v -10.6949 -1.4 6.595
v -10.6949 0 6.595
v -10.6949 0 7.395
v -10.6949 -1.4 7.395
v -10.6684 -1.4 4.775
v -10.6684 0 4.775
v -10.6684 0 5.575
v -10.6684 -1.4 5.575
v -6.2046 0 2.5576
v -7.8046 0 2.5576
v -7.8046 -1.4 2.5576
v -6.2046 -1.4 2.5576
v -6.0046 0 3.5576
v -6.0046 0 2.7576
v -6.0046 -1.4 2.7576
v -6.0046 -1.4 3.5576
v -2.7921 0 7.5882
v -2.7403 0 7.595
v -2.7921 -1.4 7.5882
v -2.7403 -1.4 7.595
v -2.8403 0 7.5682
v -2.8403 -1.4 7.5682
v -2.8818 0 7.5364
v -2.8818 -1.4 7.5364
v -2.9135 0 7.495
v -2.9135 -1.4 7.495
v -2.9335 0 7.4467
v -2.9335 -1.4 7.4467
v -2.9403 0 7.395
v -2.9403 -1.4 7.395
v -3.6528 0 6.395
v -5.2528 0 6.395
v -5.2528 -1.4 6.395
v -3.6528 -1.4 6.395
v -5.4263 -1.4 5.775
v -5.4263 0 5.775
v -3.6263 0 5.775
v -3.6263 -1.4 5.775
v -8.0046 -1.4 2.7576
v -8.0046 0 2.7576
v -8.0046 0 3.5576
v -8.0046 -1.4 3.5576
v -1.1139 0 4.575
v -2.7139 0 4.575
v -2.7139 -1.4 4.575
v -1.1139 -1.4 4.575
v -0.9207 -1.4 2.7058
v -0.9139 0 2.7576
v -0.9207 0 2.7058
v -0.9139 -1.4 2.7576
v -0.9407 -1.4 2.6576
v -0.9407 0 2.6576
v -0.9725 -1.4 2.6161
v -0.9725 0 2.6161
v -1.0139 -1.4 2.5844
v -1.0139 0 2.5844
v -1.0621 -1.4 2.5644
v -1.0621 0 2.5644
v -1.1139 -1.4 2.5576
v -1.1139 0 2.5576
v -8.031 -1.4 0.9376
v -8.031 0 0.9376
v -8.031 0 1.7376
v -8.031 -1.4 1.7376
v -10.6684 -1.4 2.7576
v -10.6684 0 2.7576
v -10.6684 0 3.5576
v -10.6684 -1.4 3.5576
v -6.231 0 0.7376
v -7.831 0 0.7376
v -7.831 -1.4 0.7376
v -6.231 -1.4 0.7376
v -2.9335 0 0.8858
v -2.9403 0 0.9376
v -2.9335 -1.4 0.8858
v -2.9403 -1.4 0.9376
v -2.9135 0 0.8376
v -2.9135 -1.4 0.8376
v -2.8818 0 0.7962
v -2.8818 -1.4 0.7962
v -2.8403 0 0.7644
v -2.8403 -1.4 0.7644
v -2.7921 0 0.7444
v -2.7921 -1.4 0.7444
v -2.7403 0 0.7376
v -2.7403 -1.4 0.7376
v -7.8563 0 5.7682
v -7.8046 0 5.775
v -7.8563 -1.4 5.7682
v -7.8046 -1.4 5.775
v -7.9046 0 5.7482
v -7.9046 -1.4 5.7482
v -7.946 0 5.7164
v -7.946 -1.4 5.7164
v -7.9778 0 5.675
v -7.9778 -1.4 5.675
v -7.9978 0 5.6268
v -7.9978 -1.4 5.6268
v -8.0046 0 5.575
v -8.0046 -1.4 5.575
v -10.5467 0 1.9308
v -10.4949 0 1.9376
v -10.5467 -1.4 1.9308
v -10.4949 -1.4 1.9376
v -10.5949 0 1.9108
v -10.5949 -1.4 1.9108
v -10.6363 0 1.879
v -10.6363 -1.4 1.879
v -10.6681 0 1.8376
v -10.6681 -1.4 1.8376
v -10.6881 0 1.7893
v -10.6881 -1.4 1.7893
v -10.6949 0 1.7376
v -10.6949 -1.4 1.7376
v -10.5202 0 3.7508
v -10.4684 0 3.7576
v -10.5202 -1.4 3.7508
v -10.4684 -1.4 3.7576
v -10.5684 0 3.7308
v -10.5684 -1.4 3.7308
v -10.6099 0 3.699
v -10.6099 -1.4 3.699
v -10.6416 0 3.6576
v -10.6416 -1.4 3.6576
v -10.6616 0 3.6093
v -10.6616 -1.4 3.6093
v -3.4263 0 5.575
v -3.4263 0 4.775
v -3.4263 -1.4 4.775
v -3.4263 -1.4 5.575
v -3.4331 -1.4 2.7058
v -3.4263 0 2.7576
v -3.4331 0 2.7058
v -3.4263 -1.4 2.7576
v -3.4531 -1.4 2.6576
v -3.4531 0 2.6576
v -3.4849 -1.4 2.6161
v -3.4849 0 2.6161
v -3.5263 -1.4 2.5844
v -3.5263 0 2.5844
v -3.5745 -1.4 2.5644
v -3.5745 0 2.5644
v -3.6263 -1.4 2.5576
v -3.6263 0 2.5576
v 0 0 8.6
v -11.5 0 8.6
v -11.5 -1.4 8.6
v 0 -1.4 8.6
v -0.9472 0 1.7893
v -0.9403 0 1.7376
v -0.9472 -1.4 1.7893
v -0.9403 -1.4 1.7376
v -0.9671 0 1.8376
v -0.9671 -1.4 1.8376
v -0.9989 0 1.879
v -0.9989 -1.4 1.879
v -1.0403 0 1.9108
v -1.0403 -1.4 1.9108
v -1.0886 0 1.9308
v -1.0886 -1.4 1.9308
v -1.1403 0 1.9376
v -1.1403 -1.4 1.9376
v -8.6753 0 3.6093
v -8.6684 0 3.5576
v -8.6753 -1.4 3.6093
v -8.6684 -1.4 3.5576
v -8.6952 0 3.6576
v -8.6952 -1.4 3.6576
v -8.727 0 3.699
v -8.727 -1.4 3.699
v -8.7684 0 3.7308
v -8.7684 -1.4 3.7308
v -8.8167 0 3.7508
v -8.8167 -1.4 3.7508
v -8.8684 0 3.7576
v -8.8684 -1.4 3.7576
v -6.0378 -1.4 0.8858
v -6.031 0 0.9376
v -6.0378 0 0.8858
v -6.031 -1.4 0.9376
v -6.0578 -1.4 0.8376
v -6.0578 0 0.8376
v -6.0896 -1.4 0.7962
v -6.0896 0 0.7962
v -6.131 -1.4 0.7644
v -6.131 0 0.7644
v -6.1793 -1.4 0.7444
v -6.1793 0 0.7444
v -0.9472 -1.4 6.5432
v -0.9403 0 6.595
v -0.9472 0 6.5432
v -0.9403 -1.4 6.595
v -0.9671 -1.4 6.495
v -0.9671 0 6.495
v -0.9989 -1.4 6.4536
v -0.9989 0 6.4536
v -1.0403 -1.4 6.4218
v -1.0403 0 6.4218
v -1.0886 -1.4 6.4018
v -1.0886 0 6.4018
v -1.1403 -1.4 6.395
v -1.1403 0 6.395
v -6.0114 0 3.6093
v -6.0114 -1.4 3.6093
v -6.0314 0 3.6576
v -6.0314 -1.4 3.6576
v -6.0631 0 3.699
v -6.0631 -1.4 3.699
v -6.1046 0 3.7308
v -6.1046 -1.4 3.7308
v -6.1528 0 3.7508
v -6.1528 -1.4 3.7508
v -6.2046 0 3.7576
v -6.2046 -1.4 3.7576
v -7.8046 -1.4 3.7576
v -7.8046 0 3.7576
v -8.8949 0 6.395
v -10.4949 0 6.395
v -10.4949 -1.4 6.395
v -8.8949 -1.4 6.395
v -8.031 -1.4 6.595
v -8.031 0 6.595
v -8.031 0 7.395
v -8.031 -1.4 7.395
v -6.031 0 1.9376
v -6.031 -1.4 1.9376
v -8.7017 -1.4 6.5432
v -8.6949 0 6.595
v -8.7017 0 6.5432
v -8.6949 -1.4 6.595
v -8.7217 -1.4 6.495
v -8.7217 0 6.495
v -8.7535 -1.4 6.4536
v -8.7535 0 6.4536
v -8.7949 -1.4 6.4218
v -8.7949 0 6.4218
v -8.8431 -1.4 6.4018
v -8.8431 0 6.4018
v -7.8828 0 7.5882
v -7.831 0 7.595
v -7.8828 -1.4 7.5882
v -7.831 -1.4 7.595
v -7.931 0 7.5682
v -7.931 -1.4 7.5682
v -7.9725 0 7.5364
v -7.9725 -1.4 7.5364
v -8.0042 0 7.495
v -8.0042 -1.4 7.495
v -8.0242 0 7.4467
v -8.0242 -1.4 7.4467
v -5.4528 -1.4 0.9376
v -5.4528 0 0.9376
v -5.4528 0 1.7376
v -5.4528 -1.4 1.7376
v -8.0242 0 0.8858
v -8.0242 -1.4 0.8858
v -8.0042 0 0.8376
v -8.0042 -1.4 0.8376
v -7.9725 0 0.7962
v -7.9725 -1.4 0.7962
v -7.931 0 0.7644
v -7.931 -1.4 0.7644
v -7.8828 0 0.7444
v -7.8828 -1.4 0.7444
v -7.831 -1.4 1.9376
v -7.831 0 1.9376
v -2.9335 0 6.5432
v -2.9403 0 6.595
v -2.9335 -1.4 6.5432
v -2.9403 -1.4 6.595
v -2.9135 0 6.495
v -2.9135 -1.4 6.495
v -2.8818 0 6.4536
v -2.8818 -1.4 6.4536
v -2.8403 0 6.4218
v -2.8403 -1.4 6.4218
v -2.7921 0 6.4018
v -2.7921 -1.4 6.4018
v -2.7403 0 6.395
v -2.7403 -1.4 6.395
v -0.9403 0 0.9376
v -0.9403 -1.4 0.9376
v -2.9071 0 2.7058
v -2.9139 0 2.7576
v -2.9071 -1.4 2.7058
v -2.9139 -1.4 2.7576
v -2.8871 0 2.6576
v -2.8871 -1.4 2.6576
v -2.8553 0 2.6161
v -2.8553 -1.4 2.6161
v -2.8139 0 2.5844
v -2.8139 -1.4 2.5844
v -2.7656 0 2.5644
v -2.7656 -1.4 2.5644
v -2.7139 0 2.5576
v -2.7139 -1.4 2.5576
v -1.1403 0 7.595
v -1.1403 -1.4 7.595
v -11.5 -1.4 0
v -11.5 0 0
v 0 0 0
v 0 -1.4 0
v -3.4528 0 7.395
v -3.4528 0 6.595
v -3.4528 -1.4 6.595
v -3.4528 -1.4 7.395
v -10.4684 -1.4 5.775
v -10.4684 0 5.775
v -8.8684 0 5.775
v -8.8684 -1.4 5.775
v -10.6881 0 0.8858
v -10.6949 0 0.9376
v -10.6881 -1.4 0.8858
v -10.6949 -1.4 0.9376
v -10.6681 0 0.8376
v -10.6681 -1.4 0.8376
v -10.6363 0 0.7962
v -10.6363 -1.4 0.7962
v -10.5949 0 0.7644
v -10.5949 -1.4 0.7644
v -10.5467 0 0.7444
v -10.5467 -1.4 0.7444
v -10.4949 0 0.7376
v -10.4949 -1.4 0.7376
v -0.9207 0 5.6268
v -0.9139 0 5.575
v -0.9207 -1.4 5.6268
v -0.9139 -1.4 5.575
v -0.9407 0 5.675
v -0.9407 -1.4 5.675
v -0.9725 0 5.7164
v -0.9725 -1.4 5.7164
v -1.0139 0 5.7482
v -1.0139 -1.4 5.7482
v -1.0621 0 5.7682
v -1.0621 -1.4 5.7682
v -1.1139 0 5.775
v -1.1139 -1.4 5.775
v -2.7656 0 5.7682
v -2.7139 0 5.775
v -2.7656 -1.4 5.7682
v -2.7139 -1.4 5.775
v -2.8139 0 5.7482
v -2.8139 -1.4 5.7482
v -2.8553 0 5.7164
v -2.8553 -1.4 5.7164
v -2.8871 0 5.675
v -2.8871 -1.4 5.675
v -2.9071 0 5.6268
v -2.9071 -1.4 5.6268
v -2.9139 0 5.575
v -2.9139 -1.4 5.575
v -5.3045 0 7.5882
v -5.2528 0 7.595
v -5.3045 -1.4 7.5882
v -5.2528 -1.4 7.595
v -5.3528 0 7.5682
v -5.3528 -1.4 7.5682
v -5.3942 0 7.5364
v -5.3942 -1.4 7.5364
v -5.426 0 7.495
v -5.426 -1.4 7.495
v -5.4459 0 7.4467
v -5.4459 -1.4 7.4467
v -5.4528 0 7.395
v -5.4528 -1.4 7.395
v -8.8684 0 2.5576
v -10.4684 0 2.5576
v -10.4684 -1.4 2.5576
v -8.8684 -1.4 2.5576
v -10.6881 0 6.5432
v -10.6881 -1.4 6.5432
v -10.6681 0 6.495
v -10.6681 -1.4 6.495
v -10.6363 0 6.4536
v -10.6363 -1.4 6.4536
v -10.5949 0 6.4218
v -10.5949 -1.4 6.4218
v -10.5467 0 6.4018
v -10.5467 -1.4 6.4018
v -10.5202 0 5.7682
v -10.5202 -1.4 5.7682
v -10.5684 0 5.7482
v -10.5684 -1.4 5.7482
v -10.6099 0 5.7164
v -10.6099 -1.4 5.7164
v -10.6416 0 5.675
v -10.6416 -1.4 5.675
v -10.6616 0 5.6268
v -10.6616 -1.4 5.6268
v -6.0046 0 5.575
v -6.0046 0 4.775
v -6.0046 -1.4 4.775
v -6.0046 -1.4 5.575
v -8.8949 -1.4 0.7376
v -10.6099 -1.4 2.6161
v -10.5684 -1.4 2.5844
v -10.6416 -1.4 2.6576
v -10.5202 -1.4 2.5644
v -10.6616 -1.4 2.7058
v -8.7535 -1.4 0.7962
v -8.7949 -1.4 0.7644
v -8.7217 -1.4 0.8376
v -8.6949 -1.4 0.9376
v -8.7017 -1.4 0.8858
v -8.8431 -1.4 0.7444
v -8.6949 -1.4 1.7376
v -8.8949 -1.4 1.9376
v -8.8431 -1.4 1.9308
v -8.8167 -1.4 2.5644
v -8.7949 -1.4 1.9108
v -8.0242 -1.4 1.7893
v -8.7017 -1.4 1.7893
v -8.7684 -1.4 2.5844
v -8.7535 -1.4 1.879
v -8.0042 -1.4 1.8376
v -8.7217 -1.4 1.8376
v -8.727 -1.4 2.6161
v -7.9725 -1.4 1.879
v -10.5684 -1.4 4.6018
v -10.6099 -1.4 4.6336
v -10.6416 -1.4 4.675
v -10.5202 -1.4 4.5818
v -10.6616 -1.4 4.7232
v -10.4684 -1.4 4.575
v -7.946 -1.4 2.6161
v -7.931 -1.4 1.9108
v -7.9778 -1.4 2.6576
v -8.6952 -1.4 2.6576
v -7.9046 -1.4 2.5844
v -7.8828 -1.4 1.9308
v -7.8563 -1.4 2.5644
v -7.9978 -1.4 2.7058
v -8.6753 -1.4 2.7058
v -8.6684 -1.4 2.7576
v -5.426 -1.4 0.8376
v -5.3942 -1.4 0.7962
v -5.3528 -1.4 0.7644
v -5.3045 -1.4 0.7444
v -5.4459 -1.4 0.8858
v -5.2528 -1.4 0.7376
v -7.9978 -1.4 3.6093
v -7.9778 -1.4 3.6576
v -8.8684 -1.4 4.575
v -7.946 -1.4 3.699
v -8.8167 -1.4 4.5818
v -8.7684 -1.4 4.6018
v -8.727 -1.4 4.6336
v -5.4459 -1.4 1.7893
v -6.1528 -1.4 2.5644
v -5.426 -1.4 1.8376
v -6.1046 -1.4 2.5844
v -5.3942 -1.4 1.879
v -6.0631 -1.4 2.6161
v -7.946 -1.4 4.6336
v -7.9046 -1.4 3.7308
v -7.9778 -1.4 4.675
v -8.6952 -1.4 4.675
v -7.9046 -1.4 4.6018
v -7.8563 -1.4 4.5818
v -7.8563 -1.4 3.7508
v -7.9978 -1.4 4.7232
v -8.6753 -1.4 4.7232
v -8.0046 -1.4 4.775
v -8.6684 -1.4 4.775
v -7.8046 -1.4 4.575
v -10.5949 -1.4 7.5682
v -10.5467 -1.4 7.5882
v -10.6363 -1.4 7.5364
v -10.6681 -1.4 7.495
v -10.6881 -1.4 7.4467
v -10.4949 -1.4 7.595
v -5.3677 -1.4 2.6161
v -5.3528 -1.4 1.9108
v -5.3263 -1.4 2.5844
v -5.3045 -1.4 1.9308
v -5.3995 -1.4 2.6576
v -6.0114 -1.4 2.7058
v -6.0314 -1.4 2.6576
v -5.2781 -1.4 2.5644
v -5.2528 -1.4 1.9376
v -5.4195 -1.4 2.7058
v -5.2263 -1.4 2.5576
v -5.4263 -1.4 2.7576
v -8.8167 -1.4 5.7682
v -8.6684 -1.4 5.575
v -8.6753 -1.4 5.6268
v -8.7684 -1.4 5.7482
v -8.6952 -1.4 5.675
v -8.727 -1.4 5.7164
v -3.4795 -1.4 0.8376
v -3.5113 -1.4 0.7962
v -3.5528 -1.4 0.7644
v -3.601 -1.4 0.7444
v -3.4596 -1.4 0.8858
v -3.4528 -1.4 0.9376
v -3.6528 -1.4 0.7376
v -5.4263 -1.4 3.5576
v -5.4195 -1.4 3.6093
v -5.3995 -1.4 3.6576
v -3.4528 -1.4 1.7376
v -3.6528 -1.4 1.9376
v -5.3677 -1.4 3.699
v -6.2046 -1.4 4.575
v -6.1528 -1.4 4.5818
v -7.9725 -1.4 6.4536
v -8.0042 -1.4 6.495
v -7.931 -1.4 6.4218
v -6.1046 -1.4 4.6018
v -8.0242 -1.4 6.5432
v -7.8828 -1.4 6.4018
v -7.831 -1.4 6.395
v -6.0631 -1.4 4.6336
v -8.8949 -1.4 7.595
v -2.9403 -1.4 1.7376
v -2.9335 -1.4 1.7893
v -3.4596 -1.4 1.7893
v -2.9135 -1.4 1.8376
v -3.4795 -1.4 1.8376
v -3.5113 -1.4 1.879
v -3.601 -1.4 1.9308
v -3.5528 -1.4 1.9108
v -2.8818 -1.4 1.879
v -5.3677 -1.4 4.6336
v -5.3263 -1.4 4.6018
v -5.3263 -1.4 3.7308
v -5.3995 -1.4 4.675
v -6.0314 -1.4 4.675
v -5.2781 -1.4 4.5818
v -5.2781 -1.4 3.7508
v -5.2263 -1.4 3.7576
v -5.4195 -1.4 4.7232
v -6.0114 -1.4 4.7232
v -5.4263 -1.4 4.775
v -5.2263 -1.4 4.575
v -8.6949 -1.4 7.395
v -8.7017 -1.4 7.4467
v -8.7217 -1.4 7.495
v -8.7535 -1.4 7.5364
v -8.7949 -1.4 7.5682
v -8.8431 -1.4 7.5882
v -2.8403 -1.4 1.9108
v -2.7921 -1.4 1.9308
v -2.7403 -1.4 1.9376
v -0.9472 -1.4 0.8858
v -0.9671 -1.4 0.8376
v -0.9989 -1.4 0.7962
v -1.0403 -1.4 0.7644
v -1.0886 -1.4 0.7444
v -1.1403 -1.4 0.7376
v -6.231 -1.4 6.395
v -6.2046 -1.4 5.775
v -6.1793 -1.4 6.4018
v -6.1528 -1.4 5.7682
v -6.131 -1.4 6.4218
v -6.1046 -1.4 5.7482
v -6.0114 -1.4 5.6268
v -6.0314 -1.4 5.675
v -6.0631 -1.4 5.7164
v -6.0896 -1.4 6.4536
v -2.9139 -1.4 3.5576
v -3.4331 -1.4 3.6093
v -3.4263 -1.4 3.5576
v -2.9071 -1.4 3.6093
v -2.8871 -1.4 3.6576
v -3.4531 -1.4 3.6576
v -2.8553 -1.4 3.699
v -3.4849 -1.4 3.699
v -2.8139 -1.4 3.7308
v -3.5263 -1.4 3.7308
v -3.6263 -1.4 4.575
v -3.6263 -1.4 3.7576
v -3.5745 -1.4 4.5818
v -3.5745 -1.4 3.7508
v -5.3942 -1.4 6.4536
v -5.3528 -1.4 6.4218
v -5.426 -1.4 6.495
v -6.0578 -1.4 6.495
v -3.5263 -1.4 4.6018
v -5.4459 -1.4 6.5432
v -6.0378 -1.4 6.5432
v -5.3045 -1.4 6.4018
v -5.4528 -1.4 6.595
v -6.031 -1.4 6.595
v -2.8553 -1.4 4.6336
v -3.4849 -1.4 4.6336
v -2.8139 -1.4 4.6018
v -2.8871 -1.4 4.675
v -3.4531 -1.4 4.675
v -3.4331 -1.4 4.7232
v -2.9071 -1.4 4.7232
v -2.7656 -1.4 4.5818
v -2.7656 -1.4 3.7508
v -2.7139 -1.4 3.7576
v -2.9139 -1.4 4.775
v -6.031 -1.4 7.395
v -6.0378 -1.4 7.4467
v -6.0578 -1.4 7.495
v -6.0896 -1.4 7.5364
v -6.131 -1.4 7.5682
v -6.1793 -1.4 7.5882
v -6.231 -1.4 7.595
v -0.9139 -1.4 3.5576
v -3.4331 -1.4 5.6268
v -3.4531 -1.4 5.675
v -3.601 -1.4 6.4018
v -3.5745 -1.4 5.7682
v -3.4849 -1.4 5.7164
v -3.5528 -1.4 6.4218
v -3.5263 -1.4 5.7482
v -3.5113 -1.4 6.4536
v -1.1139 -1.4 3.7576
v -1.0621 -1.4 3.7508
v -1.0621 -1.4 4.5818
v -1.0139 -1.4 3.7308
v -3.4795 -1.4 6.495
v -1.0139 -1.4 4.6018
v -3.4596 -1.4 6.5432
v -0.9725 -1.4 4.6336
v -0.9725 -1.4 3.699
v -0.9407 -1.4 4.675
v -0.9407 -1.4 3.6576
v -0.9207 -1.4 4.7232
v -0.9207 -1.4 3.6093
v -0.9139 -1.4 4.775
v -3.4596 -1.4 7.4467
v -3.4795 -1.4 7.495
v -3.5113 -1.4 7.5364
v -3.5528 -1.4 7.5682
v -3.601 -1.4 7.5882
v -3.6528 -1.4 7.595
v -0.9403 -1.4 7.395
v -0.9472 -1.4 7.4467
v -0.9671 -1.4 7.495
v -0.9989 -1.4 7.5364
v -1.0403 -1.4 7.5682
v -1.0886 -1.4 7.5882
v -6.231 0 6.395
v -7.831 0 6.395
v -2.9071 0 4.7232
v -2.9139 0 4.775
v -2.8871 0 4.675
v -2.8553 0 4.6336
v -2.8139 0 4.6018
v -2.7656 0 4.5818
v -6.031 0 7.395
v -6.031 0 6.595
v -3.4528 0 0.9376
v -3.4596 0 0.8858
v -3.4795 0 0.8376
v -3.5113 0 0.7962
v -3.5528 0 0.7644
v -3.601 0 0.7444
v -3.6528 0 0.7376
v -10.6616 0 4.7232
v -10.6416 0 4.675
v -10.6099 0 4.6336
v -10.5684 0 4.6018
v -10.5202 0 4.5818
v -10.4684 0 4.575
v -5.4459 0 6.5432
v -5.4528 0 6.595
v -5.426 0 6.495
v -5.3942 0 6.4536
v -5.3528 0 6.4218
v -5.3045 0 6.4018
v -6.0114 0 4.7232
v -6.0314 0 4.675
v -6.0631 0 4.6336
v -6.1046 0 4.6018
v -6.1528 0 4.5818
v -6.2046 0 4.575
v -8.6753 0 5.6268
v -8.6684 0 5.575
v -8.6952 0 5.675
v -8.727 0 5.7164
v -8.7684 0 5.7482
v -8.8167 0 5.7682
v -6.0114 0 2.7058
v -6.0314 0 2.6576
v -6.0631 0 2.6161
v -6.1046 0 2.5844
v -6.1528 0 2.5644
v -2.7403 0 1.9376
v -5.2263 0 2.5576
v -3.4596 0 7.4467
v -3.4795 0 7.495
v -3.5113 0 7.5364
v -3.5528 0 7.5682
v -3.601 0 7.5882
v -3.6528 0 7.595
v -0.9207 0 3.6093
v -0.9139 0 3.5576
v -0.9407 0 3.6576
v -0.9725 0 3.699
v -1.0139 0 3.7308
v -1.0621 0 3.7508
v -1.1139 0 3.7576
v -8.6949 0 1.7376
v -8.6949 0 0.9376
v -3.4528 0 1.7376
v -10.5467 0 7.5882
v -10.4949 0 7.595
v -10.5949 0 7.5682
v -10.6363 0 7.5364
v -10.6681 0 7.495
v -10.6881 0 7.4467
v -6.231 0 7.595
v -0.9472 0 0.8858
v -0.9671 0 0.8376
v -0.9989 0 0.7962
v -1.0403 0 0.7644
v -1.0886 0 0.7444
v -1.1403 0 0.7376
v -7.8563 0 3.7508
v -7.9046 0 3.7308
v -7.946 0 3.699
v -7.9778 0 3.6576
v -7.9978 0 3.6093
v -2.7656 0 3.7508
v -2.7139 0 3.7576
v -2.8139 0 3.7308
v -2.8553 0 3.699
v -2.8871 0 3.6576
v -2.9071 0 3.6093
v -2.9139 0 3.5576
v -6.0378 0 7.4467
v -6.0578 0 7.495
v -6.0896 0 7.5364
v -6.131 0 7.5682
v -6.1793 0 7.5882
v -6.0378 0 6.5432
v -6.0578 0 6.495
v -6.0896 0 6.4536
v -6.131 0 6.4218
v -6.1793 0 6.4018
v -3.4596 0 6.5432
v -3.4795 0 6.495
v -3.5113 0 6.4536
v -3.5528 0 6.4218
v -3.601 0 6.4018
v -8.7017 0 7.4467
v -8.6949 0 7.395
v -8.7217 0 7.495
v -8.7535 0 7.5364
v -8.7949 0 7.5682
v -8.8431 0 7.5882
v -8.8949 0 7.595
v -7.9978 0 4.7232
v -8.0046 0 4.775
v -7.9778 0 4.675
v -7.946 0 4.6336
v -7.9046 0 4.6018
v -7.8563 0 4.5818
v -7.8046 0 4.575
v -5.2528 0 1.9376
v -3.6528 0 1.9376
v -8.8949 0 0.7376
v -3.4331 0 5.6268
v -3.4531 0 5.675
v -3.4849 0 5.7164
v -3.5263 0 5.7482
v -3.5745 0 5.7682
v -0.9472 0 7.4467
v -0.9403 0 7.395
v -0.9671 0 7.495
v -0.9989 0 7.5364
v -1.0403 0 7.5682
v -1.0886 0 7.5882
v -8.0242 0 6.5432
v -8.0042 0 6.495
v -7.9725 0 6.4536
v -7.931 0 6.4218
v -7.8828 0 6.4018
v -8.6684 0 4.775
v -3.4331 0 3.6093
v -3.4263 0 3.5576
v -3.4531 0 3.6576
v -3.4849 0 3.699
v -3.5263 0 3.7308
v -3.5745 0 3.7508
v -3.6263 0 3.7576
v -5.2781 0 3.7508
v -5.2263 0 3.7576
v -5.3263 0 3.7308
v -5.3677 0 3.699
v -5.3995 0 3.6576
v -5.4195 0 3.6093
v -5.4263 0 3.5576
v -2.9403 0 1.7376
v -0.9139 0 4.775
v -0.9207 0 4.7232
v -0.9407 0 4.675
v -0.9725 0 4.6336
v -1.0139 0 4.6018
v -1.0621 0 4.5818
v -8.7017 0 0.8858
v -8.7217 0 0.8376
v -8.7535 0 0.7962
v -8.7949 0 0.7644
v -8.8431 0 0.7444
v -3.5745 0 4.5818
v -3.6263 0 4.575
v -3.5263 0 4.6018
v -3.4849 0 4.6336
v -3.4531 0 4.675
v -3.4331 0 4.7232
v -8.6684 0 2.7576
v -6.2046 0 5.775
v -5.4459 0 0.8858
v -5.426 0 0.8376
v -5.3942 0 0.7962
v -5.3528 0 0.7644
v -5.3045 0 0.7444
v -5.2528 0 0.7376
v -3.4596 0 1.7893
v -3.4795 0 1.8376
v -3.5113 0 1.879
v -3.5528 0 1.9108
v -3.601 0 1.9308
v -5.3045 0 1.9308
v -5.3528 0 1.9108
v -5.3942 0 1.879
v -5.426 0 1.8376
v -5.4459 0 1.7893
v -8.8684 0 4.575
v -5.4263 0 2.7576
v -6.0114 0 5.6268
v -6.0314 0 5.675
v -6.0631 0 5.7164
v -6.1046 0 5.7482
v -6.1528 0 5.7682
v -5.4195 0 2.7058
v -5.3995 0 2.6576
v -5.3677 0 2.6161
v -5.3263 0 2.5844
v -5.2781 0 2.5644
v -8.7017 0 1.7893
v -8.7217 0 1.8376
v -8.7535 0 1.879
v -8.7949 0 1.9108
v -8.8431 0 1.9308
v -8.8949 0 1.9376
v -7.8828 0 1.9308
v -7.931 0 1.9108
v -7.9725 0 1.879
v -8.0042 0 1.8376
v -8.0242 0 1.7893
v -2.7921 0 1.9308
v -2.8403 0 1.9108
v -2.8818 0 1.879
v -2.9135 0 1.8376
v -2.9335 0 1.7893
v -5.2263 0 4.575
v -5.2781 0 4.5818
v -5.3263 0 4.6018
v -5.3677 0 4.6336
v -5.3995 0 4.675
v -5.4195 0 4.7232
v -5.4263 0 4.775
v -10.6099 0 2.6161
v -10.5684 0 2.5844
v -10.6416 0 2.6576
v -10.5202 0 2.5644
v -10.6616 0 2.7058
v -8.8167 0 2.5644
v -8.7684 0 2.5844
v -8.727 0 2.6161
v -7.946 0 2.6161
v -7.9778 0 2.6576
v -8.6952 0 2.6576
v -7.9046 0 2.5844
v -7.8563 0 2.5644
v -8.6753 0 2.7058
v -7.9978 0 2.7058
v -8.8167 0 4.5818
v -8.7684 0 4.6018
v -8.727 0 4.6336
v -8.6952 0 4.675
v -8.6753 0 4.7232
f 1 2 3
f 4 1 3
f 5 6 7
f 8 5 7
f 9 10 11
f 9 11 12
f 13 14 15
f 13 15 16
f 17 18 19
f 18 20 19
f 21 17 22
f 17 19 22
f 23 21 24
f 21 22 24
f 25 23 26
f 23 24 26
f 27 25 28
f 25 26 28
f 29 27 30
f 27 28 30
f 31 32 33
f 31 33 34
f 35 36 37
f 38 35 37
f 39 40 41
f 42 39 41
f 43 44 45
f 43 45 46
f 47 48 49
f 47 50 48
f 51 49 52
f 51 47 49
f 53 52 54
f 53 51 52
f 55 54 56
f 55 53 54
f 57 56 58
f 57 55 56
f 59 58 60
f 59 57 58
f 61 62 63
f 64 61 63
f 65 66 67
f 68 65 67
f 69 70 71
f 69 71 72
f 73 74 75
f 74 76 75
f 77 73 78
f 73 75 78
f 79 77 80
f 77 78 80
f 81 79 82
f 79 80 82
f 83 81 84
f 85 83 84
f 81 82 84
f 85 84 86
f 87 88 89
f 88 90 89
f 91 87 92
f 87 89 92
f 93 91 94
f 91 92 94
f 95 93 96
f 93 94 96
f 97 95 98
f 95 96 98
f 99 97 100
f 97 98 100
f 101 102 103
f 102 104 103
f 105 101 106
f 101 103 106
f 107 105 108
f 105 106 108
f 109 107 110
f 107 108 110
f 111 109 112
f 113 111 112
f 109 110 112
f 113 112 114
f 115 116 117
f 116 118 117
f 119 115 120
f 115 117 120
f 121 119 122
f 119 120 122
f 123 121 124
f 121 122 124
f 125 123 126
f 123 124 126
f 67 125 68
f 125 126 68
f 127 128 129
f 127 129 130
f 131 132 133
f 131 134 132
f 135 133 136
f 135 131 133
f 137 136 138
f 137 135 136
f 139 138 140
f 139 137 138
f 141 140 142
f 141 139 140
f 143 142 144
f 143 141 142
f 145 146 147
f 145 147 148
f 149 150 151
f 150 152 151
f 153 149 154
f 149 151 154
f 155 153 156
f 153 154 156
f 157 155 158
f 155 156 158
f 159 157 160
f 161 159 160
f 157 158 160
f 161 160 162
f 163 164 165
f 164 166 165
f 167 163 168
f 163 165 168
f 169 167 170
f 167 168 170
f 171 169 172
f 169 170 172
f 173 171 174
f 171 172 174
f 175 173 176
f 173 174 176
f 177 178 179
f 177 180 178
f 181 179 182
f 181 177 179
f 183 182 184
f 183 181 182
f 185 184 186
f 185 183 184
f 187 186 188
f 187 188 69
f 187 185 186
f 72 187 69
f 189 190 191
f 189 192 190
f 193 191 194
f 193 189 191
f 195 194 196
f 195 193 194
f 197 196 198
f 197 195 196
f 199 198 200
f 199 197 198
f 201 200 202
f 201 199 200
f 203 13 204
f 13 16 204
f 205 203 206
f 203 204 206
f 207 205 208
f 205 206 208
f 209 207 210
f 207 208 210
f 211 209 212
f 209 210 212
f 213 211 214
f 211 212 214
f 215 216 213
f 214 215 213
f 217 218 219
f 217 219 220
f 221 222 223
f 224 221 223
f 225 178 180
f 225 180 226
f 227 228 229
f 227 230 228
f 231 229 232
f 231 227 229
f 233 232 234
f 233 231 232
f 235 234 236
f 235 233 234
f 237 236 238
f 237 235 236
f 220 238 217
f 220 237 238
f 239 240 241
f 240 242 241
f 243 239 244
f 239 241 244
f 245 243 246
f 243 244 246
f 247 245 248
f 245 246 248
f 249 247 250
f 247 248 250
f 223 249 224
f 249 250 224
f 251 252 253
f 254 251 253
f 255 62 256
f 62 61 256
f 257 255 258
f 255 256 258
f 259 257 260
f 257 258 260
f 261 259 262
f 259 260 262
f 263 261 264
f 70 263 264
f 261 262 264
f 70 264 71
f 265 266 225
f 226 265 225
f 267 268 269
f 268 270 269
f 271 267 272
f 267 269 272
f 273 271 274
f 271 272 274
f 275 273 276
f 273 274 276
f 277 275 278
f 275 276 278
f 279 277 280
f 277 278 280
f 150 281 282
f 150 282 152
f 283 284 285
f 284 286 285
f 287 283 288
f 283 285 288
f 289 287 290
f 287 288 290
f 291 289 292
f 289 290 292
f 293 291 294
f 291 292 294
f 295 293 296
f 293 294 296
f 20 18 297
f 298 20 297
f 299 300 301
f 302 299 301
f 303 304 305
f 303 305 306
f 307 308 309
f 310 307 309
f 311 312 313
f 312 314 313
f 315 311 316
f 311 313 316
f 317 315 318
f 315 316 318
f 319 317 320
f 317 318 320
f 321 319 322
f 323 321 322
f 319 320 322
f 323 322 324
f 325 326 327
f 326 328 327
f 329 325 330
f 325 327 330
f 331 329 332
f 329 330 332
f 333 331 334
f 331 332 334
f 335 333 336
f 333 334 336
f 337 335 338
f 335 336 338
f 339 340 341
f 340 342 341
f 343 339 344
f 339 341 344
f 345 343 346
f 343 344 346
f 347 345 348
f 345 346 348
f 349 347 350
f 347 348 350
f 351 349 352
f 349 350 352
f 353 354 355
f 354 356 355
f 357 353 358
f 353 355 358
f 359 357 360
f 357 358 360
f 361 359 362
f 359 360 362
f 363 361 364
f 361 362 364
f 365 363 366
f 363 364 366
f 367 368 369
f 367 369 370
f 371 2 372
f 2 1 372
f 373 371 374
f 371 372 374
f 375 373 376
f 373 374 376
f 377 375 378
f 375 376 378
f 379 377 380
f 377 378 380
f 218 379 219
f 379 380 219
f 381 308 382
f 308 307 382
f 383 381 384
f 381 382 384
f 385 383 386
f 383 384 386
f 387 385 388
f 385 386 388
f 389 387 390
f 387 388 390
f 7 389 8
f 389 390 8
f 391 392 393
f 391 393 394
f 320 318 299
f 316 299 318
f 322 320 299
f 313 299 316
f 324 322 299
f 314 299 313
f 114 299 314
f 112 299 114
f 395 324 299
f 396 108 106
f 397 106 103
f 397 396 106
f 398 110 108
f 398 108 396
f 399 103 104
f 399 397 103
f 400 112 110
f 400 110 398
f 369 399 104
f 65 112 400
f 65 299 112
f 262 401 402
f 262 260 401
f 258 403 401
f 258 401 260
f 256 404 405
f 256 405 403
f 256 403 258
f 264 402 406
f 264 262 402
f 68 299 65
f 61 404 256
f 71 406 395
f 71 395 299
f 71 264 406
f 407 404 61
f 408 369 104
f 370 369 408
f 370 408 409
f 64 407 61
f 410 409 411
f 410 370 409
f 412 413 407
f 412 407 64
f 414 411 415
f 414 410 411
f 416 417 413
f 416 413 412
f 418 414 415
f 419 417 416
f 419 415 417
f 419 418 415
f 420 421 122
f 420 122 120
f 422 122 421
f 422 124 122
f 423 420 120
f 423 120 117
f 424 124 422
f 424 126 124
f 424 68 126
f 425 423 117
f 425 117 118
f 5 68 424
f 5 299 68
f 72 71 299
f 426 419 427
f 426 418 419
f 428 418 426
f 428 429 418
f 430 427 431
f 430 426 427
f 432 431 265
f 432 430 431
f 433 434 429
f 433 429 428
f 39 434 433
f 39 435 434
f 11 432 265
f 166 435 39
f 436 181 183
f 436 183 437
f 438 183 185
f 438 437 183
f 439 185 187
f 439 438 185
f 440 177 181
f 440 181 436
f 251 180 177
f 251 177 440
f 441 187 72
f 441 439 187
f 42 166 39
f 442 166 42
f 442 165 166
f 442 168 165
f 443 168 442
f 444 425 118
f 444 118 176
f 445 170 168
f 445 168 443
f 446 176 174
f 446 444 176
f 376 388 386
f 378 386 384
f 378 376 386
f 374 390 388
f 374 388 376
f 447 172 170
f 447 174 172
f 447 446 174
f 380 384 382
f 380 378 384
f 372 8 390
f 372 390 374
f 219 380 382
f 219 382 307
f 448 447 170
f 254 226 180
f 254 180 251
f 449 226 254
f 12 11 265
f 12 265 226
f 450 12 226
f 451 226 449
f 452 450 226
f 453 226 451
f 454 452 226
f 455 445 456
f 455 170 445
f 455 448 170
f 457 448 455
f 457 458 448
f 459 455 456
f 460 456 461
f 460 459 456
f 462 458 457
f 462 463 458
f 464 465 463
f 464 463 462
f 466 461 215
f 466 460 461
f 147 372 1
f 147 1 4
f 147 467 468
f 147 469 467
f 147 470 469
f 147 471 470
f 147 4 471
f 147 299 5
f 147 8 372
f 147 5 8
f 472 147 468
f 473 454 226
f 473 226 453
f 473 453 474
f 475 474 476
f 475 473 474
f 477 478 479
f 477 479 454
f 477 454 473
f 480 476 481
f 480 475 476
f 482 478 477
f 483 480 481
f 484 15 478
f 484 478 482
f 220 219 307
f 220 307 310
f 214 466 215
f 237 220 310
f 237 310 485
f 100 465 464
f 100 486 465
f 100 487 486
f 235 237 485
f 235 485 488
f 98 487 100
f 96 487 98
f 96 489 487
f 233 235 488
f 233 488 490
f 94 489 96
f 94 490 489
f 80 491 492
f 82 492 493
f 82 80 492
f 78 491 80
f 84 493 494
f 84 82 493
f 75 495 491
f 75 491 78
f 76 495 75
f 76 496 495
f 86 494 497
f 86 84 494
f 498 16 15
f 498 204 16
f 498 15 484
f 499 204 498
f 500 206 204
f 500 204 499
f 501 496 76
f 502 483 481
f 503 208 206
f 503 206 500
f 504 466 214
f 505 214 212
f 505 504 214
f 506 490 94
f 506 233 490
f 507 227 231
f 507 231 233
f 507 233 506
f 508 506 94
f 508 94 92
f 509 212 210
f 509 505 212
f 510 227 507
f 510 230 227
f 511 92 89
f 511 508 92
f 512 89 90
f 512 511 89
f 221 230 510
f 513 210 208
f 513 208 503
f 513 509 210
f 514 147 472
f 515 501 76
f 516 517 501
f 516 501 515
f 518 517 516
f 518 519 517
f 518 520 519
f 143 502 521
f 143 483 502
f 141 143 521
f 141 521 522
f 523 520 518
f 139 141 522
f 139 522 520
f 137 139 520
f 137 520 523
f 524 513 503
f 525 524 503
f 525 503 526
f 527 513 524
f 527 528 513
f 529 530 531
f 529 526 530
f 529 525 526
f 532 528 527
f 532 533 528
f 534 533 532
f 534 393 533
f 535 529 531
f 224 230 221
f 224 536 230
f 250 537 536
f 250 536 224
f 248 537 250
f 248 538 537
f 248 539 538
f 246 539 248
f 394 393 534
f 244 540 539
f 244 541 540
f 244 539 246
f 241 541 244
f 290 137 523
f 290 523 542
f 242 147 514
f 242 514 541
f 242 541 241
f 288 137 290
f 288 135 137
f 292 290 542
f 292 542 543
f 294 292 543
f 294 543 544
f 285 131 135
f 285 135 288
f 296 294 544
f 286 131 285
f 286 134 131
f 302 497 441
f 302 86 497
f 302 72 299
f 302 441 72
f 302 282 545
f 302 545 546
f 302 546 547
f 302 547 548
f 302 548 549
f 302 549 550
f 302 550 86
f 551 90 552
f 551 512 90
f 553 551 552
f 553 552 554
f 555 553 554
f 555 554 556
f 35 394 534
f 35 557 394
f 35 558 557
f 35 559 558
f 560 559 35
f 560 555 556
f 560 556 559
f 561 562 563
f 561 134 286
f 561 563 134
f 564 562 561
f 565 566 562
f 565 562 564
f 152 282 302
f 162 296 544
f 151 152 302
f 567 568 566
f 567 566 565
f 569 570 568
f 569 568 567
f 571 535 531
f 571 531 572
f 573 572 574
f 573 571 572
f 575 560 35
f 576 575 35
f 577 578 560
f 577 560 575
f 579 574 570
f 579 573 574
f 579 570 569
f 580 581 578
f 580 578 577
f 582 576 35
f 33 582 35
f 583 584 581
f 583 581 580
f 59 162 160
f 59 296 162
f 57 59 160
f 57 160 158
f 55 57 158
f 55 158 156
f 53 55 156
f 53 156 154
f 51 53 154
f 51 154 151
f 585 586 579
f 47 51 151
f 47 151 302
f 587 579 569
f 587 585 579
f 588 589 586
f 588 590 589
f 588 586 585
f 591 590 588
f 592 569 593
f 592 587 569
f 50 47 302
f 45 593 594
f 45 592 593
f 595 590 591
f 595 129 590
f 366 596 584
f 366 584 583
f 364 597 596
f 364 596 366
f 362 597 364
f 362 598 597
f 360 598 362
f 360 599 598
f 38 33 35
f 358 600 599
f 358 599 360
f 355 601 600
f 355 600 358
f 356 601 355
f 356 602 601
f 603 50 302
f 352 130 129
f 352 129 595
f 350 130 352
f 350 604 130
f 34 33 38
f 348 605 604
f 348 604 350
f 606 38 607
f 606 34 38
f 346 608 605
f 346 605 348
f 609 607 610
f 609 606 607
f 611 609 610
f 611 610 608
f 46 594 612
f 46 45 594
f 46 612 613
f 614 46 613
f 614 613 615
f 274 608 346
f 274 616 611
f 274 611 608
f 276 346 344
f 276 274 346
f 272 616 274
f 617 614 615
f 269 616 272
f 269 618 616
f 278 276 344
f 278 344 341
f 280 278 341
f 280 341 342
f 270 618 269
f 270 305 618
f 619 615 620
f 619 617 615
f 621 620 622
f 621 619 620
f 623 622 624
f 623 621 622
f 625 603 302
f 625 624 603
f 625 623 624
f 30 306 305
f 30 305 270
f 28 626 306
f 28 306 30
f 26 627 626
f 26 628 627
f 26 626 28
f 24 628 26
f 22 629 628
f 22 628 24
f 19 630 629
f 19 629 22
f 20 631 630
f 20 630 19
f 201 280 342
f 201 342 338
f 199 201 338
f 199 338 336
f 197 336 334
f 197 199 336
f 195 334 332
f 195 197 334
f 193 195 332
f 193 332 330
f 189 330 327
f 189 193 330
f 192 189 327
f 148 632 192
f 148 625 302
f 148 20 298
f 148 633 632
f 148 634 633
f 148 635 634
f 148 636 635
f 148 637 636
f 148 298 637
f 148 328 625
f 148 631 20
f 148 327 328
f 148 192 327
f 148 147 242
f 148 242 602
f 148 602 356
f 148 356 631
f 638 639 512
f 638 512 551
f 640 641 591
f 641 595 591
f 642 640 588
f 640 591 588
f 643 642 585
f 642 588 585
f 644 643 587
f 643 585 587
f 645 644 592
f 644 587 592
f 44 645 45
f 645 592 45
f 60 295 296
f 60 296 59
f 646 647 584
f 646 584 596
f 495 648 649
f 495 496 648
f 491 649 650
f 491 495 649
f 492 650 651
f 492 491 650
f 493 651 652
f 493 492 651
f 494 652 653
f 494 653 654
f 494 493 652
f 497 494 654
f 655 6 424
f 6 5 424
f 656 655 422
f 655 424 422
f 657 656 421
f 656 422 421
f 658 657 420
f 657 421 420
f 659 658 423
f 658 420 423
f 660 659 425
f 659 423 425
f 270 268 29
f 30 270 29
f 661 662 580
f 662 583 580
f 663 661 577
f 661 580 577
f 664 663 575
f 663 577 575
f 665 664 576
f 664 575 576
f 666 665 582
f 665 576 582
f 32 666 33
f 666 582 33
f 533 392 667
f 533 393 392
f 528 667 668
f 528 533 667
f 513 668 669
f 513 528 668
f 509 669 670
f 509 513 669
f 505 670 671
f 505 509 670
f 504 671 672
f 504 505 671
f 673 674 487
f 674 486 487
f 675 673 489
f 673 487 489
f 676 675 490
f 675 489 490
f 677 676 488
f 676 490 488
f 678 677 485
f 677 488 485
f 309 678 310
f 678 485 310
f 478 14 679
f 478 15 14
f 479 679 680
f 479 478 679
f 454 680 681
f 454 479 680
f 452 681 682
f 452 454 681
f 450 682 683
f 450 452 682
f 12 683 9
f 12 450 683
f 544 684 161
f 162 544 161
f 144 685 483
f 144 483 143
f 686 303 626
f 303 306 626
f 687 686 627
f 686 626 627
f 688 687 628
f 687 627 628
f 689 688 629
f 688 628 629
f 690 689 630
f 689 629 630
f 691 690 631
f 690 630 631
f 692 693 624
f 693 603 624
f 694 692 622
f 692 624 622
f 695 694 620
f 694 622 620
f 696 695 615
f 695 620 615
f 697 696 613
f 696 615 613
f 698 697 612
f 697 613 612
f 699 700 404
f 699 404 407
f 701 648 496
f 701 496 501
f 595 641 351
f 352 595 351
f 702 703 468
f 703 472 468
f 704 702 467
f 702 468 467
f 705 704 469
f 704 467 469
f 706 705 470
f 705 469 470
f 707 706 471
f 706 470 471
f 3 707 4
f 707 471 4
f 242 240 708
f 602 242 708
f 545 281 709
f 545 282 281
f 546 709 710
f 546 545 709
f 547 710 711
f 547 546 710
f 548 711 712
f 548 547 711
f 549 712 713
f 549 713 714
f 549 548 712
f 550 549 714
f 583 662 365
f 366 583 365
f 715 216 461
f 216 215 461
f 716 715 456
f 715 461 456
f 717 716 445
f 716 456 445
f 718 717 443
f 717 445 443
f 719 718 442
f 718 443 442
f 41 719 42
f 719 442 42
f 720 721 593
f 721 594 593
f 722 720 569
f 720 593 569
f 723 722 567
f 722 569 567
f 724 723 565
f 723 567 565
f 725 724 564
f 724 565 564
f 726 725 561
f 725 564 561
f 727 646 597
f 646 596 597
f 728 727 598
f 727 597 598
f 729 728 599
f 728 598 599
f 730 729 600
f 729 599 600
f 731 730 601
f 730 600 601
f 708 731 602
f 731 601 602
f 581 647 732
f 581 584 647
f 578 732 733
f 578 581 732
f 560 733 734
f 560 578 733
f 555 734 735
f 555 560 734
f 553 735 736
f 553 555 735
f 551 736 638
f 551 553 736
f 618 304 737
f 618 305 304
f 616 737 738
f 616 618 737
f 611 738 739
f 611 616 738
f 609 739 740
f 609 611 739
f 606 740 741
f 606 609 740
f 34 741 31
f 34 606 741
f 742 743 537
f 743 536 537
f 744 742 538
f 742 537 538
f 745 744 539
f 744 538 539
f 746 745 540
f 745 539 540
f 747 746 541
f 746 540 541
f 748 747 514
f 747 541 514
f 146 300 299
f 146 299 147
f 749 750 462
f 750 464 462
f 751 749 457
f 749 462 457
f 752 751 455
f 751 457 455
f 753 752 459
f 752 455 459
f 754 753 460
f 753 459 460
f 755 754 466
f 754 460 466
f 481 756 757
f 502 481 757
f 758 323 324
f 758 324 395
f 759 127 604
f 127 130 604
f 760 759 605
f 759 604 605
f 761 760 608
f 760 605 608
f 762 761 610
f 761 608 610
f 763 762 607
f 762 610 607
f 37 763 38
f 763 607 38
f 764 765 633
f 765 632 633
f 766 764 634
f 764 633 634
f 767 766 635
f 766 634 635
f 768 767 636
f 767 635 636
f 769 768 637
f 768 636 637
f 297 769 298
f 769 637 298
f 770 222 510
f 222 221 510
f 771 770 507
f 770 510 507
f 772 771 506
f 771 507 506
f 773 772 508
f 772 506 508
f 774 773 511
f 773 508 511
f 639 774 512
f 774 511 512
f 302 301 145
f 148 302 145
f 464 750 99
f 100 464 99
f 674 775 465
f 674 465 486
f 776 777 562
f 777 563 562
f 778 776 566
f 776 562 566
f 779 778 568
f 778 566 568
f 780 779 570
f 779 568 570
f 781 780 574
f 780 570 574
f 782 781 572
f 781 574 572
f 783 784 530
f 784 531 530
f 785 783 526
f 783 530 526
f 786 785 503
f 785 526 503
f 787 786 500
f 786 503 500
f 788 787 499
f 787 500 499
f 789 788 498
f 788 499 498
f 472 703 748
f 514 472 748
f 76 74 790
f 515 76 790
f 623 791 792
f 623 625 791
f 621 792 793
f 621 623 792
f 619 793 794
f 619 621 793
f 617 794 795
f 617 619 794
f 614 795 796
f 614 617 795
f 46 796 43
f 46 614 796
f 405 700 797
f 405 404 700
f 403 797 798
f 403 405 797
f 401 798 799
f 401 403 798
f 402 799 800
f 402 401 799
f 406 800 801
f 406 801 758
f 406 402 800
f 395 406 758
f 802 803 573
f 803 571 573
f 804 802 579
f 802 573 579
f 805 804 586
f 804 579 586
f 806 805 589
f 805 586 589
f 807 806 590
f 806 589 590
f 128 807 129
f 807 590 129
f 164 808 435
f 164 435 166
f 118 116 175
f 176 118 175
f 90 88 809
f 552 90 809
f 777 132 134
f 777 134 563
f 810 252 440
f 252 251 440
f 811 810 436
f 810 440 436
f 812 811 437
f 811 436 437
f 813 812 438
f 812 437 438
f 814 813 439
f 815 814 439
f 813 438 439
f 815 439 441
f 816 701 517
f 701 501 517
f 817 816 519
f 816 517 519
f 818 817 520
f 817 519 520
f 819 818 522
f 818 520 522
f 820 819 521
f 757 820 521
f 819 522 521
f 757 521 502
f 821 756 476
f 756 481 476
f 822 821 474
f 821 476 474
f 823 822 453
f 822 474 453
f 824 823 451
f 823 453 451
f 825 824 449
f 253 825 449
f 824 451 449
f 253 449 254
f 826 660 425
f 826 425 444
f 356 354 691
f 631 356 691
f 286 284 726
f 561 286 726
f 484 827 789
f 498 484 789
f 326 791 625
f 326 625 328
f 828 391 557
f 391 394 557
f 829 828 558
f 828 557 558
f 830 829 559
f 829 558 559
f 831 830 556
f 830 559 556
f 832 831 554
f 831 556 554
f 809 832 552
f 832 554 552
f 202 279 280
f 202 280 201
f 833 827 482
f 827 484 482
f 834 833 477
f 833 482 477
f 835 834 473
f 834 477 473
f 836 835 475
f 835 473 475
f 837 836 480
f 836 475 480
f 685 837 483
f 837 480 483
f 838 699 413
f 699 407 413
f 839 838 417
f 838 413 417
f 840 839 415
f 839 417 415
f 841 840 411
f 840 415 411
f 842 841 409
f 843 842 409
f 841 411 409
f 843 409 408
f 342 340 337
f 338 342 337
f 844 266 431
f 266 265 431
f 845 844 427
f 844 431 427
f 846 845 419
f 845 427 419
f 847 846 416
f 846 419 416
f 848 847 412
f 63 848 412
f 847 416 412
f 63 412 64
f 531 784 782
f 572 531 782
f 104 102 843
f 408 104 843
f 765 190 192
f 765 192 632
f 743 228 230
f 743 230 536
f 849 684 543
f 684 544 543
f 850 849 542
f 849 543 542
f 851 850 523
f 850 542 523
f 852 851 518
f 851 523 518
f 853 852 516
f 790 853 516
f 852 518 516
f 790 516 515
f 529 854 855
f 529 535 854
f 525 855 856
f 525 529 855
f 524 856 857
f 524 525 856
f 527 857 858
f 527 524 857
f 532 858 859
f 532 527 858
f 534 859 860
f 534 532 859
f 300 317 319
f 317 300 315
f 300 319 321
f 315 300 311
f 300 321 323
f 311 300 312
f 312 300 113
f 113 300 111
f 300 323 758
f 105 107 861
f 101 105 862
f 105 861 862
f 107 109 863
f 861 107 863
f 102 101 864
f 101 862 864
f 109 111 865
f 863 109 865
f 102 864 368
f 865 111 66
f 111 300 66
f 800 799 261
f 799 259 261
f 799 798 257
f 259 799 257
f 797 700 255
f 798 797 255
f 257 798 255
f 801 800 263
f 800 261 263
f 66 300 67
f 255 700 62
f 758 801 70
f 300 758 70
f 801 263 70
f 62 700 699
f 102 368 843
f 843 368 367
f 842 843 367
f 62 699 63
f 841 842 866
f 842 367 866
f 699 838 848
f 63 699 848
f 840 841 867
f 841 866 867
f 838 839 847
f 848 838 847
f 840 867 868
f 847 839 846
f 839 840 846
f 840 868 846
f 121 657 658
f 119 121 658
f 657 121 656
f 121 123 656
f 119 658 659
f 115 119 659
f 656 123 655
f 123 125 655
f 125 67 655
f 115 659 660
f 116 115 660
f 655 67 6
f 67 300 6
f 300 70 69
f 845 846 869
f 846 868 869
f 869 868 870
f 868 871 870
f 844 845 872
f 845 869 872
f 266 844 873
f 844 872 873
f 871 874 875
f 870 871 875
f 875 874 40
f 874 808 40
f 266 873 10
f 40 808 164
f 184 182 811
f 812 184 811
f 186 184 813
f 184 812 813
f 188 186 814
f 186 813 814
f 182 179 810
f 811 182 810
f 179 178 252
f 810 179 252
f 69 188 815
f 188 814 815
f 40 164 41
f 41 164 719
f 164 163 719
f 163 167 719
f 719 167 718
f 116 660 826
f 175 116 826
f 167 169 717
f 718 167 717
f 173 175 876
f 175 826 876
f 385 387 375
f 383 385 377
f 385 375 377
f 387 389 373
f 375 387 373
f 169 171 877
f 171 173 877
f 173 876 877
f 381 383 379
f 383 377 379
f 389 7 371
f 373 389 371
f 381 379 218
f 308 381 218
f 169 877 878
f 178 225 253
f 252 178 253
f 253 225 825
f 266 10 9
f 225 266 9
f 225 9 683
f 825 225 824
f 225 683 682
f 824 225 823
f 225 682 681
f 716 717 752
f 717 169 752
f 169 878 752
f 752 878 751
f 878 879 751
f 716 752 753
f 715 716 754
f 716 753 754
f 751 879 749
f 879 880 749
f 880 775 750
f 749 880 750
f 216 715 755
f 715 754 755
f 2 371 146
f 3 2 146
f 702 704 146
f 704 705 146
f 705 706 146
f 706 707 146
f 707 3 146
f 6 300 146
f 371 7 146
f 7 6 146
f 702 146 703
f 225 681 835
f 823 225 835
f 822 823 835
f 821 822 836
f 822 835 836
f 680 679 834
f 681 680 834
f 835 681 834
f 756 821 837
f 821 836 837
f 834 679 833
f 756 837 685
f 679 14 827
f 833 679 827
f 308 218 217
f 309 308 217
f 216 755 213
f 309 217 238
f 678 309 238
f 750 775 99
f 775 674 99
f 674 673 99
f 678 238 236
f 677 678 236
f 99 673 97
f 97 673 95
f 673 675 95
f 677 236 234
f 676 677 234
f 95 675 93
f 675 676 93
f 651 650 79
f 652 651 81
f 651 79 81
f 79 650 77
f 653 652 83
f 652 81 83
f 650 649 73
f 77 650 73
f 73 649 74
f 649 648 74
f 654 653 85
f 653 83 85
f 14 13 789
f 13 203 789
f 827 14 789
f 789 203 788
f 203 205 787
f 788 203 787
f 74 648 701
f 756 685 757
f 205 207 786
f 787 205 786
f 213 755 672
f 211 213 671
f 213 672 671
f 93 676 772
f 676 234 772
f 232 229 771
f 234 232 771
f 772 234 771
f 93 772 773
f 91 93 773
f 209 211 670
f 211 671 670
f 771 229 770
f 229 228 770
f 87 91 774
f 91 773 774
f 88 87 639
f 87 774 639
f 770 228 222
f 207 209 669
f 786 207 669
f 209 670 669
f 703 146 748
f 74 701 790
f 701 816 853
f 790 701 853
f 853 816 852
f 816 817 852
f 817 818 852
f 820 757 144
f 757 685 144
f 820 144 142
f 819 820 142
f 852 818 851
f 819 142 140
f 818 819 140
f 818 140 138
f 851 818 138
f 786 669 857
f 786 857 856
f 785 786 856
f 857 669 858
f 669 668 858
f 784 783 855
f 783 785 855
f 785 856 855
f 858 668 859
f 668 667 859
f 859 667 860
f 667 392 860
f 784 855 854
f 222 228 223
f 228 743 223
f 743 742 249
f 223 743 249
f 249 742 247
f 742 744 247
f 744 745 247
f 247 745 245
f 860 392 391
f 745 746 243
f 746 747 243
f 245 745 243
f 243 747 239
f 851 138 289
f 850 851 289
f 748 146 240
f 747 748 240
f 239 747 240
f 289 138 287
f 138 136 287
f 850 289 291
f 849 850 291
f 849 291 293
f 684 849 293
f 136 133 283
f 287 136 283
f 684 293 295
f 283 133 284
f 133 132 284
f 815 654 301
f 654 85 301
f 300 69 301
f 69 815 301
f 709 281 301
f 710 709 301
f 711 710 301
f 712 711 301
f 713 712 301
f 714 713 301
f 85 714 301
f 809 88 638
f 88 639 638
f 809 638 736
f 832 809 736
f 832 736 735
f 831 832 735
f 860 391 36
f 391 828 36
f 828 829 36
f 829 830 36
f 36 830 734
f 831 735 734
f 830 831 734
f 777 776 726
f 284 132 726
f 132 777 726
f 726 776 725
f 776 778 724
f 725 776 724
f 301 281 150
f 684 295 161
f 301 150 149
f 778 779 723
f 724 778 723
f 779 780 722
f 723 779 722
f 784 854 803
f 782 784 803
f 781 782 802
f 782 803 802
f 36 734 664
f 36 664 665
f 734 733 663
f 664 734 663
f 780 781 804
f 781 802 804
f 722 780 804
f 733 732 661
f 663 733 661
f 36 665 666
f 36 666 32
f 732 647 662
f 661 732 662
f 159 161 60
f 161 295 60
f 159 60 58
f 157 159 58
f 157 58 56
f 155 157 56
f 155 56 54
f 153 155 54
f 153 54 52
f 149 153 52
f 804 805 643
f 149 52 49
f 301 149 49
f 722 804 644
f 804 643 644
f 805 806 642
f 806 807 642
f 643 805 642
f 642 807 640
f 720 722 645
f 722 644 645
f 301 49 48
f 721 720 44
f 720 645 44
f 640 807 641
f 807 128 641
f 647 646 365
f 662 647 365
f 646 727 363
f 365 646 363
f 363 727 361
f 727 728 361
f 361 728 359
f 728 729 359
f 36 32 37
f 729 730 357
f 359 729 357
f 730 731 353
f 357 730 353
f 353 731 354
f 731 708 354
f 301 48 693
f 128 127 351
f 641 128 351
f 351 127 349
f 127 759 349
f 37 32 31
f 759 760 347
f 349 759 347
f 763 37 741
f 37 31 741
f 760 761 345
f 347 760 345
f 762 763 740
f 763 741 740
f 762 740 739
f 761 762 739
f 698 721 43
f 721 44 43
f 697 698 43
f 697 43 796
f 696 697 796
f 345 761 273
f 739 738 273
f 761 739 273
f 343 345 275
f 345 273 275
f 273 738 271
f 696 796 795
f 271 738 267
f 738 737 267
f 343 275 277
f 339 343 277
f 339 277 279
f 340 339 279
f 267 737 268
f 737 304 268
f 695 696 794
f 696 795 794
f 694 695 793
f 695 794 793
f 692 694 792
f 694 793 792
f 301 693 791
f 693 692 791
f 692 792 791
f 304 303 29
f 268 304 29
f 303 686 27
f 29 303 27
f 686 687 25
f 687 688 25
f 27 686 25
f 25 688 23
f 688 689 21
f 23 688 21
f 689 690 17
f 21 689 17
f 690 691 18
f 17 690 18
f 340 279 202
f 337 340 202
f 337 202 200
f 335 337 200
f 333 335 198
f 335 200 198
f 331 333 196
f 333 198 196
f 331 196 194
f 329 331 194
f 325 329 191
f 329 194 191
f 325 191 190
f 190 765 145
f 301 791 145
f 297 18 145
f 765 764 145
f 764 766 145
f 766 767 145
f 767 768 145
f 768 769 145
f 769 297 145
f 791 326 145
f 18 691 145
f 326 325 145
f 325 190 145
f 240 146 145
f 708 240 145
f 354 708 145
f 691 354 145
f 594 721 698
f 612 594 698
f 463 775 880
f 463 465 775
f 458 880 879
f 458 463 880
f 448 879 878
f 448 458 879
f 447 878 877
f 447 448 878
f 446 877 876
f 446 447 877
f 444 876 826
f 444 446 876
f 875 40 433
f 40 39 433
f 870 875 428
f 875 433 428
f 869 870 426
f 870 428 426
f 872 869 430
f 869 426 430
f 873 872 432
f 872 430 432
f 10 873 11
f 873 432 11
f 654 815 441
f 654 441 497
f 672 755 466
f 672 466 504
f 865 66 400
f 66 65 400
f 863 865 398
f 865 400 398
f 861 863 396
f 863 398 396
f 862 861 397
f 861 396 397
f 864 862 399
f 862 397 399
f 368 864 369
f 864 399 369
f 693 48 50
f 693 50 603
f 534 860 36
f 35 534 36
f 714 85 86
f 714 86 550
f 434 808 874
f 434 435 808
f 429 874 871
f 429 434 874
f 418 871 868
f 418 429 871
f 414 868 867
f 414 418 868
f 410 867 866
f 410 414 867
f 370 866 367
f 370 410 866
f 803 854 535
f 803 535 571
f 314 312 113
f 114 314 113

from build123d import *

# Parameters (mm, degrees)
F0_W     = 11.5
F0_H     = 8.6
F2_DEPTH = 1.4
F1_W     = 2
F1_H     = 1.2
F3_DEPTH = 1.4
F4_R     = 0.2
F5_R     = 0.2
F6_R     = 0.2


with BuildPart() as f2:
    # F0 (on Front) → F2 (new body)
    with BuildSketch(Plane.XZ):
        with Locations((-5.75, 4.3)):
            Rectangle(F0_W, F0_H)
    extrude(amount=F2_DEPTH)

    # F1 (on Front) → F3 (cut)
    with BuildSketch(Plane.XZ):
        with Locations((-9.694906, 6.994985)):
            Rectangle(F1_W, F1_H)
        with Locations((-7.031034, 6.994985)):
            Rectangle(F1_W, F1_H)
        with Locations((-4.452752, 6.994985)):
            Rectangle(F1_W, F1_H)
        with Locations((-1.940339, 6.994985)):
            Rectangle(F1_W, F1_H)
        with Locations((-9.668441, 5.175)):
            Rectangle(F1_W, F1_H)
        with Locations((-7.004568, 5.175)):
            Rectangle(F1_W, F1_H)
        with Locations((-4.426287, 5.175)):
            Rectangle(F1_W, F1_H)
        with Locations((-1.913873, 5.175)):
            Rectangle(F1_W, F1_H)
        with Locations((-9.668441, 3.157565)):
            Rectangle(F1_W, F1_H)
        with Locations((-4.426287, 3.157565)):
            Rectangle(F1_W, F1_H)
        with Locations((-7.004568, 3.157565)):
            Rectangle(F1_W, F1_H)
        with Locations((-1.940339, 1.33758)):
            Rectangle(F1_W, F1_H)
        with Locations((-1.913873, 3.157565)):
            Rectangle(F1_W, F1_H)
        with Locations((-4.452752, 1.33758)):
            Rectangle(F1_W, F1_H)
        with Locations((-7.031034, 1.33758)):
            Rectangle(F1_W, F1_H)
        with Locations((-9.694906, 1.33758)):
            Rectangle(F1_W, F1_H)
    extrude(amount=F3_DEPTH, mode=Mode.SUBTRACT)

    # F4
    f4_edges = [f2.edges().sort_by_distance(p)[0] for p in [
        (-10.668441, -0.7, 3.757565),
        (-10.668441, -0.7, 5.775),
        (-10.694906, -0.7, 7.594985),
        (-8.031034, -0.7, 1.93758),
        (-10.694906, -0.7, 1.93758),
        (-8.004568, -0.7, 3.757565),
        (-8.004568, -0.7, 5.775),
        (-8.031034, -0.7, 7.594985),
        (-5.452752, -0.7, 7.594985),
        (-5.426287, -0.7, 3.757565),
        (-5.452752, -0.7, 1.93758),
        (-2.913873, -0.7, 3.757565),
        (-2.940339, -0.7, 1.93758),
        (-2.913873, -0.7, 5.775),
        (-2.940339, -0.7, 7.594985),
    ]]
    fillet(f4_edges, radius=F4_R)

    # F5
    f5_edges = [f2.edges().sort_by_distance(p)[0] for p in [
        (-8.694906, -0.7, 0.73758),
        (-8.668441, -0.7, 2.557565),
        (-8.668441, -0.7, 4.575),
        (-8.694906, -0.7, 6.394985),
        (-6.031034, -0.7, 6.394985),
        (-6.004568, -0.7, 4.575),
        (-6.004568, -0.7, 2.557565),
        (-6.031034, -0.7, 0.73758),
        (-3.452752, -0.7, 0.73758),
        (-3.426287, -0.7, 2.557565),
        (-3.426287, -0.7, 4.575),
        (-3.452752, -0.7, 6.394985),
        (-0.940339, -0.7, 6.394985),
        (-0.913873, -0.7, 4.575),
        (-0.913873, -0.7, 2.557565),
        (-0.940339, -0.7, 0.73758),
        (-2.940339, -0.7, 0.73758),
        (-2.913873, -0.7, 2.557565),
        (-2.913873, -0.7, 4.575),
        (-2.940339, -0.7, 6.394985),
        (-5.452752, -0.7, 6.394985),
        (-5.426287, -0.7, 4.575),
        (-5.426287, -0.7, 2.557565),
        (-5.452752, -0.7, 0.73758),
        (-8.031034, -0.7, 0.73758),
        (-8.004568, -0.7, 2.557565),
        (-8.004568, -0.7, 4.575),
        (-8.031034, -0.7, 6.394985),
        (-10.694906, -0.7, 6.394985),
        (-10.668441, -0.7, 4.575),
        (-10.668441, -0.7, 2.557565),
        (-10.694906, -0.7, 0.73758),
    ]]
    fillet(f5_edges, radius=F5_R)

    # F6
    f6_edges = [f2.edges().sort_by_distance(p)[0] for p in [
        (-8.694906, -0.7, 7.594985),
        (-8.668441, -0.7, 5.775),
        (-8.668441, -0.7, 3.757565),
        (-8.694906, -0.7, 1.93758),
        (-6.004568, -0.7, 3.757565),
        (-6.004568, -0.7, 5.775),
        (-6.031034, -0.7, 7.594985),
        (-3.452752, -0.7, 7.594985),
        (-3.426287, -0.7, 5.775),
        (-3.426287, -0.7, 3.757565),
        (-3.452752, -0.7, 1.93758),
        (-0.913873, -0.7, 3.757565),
        (-0.940339, -0.7, 1.93758),
        (-0.913873, -0.7, 5.775),
        (-0.940339, -0.7, 7.594985),
    ]]
    fillet(f6_edges, radius=F6_R)


solid = f2.part
